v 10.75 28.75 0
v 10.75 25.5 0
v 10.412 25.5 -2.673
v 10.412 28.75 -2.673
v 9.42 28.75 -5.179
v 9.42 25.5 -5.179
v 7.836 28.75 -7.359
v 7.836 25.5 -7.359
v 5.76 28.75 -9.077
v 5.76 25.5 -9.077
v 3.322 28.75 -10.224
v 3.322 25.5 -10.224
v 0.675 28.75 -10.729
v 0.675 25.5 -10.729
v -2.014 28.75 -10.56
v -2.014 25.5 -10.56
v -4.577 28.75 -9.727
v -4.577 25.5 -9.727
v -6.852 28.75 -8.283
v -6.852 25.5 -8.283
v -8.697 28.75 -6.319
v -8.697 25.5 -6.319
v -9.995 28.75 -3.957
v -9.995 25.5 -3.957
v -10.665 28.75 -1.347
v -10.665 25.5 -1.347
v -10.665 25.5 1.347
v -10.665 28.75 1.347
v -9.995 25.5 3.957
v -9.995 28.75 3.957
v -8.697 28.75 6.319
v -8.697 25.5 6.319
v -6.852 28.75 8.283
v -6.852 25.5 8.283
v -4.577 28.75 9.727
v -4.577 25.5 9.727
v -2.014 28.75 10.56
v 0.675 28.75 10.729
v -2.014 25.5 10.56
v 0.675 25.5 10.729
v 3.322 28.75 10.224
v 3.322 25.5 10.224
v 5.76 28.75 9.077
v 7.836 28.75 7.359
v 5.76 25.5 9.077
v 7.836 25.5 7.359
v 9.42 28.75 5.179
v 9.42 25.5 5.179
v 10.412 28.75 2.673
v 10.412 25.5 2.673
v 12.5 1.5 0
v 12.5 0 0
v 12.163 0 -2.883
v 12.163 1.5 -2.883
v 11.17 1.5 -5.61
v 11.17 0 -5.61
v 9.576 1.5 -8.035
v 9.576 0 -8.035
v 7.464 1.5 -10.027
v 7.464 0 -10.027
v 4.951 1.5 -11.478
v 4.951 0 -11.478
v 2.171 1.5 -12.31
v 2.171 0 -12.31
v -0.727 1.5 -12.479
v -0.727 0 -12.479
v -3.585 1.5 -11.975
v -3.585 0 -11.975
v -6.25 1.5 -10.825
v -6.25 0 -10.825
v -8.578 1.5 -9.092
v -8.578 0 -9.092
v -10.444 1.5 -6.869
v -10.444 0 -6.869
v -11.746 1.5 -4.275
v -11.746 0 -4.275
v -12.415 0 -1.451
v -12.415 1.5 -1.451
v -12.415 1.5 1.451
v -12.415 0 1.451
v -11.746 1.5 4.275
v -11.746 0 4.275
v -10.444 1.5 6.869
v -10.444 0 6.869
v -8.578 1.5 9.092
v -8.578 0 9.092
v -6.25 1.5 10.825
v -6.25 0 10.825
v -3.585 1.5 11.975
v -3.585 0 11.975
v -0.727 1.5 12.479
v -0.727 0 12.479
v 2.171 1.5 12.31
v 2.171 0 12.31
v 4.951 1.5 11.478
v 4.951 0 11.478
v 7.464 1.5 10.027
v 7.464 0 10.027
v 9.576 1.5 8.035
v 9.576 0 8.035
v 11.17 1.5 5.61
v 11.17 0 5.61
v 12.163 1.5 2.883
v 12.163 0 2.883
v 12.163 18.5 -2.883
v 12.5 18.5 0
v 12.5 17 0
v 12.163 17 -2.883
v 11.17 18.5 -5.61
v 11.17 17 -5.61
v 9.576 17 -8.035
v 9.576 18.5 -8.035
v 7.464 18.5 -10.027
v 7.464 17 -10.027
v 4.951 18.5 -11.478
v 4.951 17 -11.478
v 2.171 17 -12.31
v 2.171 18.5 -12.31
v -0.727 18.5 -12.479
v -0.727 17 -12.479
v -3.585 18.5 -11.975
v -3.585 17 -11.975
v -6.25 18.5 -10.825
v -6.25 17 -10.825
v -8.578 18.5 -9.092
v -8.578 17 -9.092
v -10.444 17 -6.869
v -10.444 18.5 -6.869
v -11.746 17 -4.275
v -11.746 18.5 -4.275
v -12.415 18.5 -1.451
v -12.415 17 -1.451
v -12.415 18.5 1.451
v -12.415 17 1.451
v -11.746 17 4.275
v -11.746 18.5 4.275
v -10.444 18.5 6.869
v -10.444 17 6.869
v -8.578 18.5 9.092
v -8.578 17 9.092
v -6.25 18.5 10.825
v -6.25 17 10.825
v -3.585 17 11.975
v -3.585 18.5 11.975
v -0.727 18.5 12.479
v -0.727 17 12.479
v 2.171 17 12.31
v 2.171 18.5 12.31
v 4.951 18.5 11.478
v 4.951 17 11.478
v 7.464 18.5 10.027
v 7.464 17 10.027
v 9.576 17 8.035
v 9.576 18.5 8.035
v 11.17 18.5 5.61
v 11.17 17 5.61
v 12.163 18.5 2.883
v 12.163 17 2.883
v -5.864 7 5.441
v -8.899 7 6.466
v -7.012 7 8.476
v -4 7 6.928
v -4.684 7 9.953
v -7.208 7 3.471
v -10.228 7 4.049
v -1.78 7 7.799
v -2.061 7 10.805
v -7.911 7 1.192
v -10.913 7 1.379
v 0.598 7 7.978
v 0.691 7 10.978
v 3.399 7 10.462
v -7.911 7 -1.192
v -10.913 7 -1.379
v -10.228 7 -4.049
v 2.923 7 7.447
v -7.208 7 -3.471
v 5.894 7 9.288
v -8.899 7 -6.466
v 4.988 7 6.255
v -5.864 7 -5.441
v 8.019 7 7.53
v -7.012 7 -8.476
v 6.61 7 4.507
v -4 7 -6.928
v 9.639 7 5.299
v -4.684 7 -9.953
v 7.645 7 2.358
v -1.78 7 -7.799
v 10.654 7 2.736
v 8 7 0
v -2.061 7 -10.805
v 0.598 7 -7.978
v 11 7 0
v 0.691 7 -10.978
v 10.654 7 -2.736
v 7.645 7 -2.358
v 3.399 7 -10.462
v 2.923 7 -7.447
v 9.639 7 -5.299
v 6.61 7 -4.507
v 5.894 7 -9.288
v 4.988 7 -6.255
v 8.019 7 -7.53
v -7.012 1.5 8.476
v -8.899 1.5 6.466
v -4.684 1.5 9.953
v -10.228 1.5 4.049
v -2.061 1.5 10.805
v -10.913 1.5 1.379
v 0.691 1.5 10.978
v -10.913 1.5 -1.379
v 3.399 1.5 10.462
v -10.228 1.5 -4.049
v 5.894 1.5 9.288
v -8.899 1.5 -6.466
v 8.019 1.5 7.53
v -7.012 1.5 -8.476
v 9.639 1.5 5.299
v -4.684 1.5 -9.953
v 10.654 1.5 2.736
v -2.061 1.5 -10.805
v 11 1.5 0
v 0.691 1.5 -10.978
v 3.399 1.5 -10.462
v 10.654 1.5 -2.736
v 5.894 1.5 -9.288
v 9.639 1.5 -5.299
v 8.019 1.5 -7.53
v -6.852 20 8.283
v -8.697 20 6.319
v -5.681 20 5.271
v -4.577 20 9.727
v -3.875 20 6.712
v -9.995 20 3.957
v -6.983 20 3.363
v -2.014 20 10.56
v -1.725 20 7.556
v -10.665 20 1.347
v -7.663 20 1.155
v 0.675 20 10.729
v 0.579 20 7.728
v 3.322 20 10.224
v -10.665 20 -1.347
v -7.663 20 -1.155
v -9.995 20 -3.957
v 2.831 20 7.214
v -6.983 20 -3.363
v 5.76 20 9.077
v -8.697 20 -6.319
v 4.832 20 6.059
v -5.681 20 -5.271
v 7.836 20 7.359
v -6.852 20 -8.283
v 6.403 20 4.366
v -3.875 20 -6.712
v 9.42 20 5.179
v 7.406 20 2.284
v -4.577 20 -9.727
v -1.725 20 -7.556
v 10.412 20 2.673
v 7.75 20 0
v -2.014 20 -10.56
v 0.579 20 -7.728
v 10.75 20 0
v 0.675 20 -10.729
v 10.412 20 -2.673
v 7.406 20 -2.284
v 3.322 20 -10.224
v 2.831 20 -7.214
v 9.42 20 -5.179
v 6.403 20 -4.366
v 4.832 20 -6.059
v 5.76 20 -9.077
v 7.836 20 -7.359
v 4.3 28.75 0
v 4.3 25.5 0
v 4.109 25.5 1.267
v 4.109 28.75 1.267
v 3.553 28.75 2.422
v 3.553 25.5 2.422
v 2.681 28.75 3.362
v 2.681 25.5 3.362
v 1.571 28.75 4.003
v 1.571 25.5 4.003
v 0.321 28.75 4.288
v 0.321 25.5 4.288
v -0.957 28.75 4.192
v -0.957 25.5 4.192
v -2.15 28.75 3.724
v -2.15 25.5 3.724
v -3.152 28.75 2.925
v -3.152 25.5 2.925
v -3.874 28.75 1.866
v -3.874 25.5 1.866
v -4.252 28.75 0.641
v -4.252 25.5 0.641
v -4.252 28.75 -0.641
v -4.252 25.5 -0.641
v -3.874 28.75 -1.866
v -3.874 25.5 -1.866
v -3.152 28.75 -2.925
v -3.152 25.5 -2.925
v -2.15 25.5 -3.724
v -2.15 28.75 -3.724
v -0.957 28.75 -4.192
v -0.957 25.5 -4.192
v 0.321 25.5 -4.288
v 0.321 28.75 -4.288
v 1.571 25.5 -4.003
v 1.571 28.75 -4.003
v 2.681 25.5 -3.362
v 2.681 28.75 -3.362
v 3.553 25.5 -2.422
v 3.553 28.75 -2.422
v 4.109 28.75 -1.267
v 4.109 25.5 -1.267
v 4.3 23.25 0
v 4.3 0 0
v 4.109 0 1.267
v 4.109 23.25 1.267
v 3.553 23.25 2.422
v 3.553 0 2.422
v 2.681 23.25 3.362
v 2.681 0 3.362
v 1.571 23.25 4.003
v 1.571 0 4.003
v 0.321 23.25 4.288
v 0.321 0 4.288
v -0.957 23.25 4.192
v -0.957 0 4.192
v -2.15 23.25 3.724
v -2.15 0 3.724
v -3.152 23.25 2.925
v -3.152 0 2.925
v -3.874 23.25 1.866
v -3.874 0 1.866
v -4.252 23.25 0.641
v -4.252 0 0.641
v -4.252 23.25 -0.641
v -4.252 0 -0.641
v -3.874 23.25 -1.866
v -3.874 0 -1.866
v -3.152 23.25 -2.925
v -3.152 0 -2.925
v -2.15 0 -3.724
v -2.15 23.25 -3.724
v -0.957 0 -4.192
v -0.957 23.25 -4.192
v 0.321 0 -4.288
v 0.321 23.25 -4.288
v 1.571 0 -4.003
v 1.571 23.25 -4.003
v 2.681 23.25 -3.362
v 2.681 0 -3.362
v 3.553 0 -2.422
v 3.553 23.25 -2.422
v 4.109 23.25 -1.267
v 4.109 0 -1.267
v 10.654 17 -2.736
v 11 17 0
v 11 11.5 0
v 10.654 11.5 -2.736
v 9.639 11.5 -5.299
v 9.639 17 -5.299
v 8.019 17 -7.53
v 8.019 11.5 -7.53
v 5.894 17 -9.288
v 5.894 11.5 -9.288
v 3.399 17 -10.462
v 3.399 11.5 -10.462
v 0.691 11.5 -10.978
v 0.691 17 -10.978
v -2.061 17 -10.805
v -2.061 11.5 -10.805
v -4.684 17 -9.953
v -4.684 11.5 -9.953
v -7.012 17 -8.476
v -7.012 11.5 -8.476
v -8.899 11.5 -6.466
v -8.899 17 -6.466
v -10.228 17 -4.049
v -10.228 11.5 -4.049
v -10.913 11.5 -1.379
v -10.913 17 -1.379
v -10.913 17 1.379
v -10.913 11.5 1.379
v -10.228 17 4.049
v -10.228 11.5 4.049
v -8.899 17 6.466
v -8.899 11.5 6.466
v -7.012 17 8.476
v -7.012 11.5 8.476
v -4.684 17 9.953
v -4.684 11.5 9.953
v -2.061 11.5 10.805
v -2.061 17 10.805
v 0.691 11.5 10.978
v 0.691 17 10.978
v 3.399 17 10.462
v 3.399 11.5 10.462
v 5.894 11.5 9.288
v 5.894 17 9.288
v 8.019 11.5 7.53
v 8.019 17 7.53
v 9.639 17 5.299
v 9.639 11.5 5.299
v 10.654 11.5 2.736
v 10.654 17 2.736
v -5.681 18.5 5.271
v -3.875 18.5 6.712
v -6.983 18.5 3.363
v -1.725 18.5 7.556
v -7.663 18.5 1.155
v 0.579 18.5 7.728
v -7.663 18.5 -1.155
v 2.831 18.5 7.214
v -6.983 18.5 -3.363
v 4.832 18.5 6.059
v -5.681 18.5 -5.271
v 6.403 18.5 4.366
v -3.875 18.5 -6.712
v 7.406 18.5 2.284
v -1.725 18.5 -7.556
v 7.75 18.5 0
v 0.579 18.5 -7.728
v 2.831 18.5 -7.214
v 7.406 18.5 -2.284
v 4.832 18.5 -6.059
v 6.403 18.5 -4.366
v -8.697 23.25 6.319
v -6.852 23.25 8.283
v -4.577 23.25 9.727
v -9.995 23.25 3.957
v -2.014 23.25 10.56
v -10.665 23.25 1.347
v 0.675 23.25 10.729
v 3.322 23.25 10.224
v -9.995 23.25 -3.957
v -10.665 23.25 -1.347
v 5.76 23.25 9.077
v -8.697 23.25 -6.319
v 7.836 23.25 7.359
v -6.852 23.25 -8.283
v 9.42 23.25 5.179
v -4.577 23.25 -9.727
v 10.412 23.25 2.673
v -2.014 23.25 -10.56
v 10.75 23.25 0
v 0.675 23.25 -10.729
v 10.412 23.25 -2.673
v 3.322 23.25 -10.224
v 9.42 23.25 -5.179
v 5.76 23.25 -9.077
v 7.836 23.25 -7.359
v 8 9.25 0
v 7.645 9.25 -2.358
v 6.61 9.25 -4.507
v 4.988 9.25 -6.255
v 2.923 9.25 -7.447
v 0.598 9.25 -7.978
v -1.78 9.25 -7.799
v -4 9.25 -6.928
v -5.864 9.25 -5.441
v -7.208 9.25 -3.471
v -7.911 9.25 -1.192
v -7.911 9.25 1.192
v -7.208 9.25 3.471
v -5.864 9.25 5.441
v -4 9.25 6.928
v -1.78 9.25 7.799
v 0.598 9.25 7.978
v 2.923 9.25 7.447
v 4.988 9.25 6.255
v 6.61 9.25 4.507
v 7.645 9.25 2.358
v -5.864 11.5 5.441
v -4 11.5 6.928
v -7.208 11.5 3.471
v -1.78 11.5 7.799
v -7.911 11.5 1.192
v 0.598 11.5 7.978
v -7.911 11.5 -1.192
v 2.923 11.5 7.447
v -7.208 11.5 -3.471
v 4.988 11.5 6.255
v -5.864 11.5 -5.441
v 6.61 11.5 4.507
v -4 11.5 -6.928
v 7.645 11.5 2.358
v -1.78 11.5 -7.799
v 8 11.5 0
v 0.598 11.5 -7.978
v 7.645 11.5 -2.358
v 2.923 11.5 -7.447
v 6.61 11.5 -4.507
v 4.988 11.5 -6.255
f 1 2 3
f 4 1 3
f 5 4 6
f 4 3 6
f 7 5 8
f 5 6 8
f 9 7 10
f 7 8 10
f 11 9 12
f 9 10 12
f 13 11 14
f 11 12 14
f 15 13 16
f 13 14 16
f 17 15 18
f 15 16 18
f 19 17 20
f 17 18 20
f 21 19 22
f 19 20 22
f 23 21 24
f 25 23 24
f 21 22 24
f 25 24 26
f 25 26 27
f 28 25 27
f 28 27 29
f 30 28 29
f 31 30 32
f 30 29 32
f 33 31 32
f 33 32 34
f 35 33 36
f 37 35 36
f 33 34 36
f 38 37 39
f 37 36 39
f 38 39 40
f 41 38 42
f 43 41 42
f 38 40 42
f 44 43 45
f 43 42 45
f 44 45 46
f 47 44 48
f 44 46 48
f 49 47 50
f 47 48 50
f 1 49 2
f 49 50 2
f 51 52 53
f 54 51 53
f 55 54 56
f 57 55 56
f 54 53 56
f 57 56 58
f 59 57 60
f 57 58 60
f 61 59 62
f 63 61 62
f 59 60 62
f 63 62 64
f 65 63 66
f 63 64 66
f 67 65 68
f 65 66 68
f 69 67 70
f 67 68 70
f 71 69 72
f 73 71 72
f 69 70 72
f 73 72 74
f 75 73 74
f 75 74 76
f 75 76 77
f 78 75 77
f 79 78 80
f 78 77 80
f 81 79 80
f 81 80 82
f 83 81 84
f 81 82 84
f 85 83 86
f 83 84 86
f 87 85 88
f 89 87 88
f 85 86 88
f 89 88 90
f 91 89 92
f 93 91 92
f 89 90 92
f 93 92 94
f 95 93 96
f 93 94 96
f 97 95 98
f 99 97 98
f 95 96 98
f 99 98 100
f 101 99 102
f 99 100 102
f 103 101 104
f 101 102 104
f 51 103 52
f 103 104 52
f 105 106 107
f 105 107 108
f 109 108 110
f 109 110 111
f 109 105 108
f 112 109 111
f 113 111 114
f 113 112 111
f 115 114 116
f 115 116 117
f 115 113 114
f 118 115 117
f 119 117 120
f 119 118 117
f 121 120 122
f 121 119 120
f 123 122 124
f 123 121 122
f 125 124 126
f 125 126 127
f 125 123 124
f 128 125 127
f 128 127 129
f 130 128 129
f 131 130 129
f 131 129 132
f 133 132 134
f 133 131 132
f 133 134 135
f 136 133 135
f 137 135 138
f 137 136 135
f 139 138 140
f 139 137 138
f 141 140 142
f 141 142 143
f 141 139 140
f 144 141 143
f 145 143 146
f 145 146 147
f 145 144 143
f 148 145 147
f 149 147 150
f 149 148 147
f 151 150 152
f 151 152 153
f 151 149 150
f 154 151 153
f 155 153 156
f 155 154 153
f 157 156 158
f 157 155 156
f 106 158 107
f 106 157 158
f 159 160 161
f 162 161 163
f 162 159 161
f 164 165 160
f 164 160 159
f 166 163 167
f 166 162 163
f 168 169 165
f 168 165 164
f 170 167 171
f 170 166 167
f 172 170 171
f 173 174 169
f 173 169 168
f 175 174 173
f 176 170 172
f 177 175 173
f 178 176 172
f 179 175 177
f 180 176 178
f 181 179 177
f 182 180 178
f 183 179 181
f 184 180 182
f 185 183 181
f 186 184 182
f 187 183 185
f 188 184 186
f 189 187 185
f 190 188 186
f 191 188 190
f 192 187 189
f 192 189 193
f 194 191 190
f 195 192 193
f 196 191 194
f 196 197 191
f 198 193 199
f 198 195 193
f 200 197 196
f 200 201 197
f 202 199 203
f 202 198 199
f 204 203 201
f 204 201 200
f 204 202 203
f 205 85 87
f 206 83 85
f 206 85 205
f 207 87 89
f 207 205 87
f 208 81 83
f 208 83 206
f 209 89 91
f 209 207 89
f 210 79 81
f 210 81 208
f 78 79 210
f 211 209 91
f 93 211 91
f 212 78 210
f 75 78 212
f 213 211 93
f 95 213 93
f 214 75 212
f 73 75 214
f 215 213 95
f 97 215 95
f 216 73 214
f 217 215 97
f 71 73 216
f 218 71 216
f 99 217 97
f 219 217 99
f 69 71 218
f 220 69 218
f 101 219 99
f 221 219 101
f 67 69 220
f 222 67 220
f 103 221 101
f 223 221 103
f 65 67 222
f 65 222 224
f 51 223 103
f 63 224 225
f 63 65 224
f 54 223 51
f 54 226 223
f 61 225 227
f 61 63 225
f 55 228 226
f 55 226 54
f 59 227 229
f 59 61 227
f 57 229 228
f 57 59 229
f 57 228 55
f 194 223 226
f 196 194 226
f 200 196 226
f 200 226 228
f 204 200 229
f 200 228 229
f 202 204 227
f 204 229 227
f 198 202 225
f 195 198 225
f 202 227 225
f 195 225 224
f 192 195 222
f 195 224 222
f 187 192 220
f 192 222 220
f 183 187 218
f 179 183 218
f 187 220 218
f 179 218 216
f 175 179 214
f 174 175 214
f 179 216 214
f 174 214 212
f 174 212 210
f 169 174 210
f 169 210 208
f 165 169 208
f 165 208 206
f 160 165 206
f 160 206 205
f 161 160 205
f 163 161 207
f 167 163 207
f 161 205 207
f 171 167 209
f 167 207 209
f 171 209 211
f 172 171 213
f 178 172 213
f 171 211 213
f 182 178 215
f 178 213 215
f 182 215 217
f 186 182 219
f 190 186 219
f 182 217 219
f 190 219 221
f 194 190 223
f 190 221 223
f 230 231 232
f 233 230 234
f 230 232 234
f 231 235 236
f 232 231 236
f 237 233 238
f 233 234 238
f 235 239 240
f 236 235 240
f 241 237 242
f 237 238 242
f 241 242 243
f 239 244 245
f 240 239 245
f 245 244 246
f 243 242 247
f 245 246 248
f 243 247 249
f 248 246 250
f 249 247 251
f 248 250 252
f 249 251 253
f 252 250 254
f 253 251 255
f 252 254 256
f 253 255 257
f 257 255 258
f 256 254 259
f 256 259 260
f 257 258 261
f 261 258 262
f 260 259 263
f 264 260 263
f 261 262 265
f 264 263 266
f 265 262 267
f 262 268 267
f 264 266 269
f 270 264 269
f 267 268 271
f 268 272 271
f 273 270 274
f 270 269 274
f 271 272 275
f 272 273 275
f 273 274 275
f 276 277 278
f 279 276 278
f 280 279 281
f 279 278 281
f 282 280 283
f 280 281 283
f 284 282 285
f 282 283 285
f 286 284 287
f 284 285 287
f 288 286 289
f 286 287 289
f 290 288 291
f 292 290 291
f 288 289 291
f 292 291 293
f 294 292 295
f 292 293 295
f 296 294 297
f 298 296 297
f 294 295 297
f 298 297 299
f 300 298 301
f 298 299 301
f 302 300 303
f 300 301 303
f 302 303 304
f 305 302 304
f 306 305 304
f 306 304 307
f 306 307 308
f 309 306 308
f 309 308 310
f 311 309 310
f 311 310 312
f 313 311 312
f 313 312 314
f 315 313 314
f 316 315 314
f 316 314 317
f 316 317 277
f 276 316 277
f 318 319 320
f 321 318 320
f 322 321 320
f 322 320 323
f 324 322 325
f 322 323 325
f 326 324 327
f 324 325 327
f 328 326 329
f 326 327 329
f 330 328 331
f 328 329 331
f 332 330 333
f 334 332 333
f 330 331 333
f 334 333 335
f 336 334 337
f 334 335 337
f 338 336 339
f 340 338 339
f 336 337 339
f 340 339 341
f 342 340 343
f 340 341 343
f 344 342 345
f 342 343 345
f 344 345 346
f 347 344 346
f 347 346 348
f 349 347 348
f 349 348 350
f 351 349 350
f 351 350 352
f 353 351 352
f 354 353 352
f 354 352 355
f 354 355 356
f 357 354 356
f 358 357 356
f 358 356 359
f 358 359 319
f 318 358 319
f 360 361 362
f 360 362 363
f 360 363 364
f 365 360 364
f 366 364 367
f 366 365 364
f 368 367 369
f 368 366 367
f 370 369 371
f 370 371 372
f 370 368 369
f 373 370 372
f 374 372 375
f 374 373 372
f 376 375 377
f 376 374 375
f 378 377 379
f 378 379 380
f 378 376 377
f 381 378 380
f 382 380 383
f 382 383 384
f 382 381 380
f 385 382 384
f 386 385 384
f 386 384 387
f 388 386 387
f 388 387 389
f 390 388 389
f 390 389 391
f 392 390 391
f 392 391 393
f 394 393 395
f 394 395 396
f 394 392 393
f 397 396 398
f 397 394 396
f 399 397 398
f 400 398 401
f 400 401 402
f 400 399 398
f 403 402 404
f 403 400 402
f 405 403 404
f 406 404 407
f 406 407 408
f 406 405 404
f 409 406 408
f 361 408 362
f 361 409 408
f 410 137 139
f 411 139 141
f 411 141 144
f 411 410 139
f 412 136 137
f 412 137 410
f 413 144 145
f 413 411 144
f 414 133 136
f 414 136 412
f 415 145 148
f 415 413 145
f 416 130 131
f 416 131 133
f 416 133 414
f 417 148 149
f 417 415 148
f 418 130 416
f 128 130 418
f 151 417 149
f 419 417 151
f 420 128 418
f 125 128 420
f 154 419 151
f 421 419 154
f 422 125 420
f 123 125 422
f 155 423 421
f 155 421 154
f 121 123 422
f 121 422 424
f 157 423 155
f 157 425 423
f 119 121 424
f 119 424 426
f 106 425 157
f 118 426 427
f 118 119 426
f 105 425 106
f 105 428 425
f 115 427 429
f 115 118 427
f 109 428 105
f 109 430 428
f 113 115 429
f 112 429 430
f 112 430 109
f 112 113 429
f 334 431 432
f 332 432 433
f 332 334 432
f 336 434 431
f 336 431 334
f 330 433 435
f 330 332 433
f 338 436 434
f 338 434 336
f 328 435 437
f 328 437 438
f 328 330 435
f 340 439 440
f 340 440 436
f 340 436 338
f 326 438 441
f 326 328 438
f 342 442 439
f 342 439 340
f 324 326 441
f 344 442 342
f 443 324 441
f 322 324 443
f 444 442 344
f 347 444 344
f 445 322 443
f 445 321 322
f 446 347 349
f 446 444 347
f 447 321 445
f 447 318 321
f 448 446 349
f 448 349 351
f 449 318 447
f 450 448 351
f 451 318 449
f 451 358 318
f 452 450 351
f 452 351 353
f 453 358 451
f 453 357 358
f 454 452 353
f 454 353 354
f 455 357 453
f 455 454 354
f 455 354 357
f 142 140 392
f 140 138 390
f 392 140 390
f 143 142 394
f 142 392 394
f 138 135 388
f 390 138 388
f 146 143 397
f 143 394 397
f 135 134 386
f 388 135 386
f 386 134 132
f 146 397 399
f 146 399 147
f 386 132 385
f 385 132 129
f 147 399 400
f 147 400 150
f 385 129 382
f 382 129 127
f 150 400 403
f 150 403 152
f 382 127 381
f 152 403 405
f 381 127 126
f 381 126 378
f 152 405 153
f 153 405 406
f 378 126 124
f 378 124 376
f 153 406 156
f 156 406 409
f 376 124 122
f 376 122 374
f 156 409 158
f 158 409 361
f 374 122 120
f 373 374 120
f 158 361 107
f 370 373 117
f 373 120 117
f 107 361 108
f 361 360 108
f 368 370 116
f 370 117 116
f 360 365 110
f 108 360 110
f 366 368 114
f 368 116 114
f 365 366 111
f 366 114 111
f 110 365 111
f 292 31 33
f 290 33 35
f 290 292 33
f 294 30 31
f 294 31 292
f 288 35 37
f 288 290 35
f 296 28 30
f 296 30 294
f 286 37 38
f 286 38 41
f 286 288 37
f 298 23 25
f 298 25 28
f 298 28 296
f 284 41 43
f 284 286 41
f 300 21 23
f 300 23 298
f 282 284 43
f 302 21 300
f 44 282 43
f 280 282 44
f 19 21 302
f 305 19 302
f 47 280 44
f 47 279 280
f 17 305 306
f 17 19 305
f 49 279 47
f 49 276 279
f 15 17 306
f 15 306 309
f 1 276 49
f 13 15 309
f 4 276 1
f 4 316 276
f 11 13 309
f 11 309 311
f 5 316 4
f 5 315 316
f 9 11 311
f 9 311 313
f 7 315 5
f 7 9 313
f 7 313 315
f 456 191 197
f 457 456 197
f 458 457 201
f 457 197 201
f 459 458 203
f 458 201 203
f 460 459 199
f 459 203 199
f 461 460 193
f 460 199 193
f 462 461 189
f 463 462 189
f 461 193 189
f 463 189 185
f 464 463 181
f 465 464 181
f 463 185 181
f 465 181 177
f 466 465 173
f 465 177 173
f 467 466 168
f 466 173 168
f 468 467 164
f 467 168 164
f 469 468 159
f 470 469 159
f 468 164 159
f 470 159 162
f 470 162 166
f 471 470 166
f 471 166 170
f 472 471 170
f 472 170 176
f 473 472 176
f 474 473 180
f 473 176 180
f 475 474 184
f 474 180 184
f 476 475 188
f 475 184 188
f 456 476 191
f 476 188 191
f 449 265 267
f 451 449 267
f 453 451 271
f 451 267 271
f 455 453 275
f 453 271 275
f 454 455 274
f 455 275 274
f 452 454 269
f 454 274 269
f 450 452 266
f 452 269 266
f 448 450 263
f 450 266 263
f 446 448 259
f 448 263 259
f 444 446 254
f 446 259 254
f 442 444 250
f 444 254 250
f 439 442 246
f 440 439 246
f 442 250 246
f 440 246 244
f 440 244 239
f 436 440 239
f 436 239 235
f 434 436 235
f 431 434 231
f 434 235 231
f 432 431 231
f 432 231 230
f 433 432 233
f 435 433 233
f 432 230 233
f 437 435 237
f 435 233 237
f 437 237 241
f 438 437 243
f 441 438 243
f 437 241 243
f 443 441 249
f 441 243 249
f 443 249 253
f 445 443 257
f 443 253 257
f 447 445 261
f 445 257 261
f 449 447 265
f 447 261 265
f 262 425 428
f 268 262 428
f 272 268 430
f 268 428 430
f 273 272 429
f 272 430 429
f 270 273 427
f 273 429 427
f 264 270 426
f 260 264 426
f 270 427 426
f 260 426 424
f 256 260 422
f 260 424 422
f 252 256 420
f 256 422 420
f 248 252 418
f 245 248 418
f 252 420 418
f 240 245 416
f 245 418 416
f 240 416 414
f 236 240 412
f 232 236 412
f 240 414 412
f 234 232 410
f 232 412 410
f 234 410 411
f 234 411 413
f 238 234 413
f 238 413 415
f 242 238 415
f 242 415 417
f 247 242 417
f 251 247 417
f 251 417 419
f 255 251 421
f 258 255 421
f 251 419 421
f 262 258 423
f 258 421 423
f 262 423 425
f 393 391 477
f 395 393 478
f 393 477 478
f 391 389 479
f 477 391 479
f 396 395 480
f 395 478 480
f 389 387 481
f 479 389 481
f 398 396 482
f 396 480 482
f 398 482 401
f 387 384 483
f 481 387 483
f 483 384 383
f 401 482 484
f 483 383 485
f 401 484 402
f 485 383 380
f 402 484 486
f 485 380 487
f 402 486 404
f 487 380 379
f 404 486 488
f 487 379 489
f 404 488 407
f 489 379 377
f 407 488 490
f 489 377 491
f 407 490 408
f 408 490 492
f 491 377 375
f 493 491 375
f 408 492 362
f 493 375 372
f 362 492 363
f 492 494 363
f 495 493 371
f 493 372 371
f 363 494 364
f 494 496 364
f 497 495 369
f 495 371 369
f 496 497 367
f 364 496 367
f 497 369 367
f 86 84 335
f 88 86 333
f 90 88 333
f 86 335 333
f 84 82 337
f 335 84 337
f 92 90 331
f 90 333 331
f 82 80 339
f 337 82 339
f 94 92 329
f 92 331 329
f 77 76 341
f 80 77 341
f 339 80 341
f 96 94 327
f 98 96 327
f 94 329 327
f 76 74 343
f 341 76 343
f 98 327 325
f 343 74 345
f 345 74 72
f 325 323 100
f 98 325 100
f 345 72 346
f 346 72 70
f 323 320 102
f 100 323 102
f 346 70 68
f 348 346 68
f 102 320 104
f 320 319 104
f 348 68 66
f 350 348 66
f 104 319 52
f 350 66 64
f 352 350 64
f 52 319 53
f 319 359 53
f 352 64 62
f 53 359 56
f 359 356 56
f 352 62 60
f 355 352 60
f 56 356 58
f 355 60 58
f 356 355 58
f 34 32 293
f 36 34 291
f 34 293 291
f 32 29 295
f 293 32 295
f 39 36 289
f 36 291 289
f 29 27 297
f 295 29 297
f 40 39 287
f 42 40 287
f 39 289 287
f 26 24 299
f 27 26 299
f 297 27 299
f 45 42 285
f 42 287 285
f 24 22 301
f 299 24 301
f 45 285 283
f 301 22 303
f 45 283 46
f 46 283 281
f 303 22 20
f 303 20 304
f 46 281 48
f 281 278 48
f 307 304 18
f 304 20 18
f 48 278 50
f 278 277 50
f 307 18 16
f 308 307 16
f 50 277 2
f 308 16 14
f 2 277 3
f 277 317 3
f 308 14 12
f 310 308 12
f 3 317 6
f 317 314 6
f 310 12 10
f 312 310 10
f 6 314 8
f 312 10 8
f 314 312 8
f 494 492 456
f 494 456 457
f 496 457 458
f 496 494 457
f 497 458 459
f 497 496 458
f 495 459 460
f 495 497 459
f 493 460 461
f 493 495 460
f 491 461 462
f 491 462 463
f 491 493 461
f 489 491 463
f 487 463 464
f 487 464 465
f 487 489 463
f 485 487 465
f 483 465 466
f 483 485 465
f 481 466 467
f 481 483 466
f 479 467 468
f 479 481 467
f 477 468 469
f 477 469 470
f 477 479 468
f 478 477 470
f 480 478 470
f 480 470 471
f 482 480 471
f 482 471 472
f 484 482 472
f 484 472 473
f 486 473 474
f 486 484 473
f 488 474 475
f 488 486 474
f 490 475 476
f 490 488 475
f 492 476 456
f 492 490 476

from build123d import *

# Parameters (mm, degrees)
SKETCH1_R           = 12.5
BOSS_EXTRUDE1_DEPTH = 1.5
SKETCH2_R           = 11
BOSS_EXTRUDE2_DEPTH = 5.5
SKETCH3_R           = 8
BOSS_EXTRUDE3_DEPTH = 2.25
SKETCH4_R           = 7.75
BOSS_EXTRUDE4_DEPTH = 1.5
SKETCH5_R           = 10.75
BOSS_EXTRUDE6_DEPTH = 3.25
BOSS_EXTRUDE7_START = 2.25
SKETCH10_R          = 10.75
BOSS_EXTRUDE7_DEPTH = 3.25
SKETCH6_R           = 4.3
CUT_EXTRUDE2_DEPTH  = 50


with BuildPart() as part:
    # Sketch1 → Boss-Extrude1 (new body)
    with BuildSketch(Plane(origin=(0, 0, 0), x_dir=(1, 0, 0), z_dir=(0, 1, 0))):
        Circle(SKETCH1_R)
    extrude(amount=BOSS_EXTRUDE1_DEPTH)

    # Sketch2 → Boss-Extrude2 (add)
    with BuildSketch(Plane(origin=(0, 1.5, 0), x_dir=(1, 0, 0), z_dir=(0, 1, 0))):
        Circle(SKETCH2_R)
    extrude(amount=BOSS_EXTRUDE2_DEPTH)

    # Sketch3 → Boss-Extrude3 (add)
    with BuildSketch(Plane(origin=(0, 7, 0), x_dir=(1, 0, 0), z_dir=(0, 1, 0))):
        Circle(SKETCH3_R)
    extrude(amount=BOSS_EXTRUDE3_DEPTH)

    # Mirror1: part across plane


with BuildPart() as part_1:
    add(part.part)
    add(part.part.mirror(Plane.ZX.offset(9.25)))

    # Sketch4 → Boss-Extrude4 (add)
    with BuildSketch(Plane(origin=(0, 18.5, 0), x_dir=(1, 0, 0), z_dir=(0, 1, 0))):
        Circle(SKETCH4_R)
    extrude(amount=BOSS_EXTRUDE4_DEPTH)

    # Sketch5 → Boss-Extrude6 (add)
    with BuildSketch(Plane(origin=(0, 20, 0), x_dir=(1, 0, 0), z_dir=(0, 1, 0))):
        Circle(SKETCH5_R)
    extrude(amount=BOSS_EXTRUDE6_DEPTH)


with BuildPart() as body_2:
    # Sketch10 → Boss-Extrude7 (new body)
    with BuildSketch(Plane(origin=(0, 23.25, 0), x_dir=(1, 0, 0), z_dir=(0, 1, 0)).offset(BOSS_EXTRUDE7_START)):
        Circle(SKETCH10_R)
    extrude(amount=BOSS_EXTRUDE7_DEPTH)


with BuildPart() as cut_extrude2_tool:
    # Sketch6 → Cut-Extrude2 (new body)
    with BuildSketch(Plane.XZ):
        Circle(SKETCH6_R)
    extrude(amount=-CUT_EXTRUDE2_DEPTH)


with BuildPart() as part_2:
    add(part_1.part)

    # Cut-Extrude2: cut by cut_extrude2_tool
    add(cut_extrude2_tool.part, mode=Mode.SUBTRACT)


with BuildPart() as body_2_1:
    add(body_2.part)

    # Cut-Extrude2: cut by cut_extrude2_tool
    add(cut_extrude2_tool.part, mode=Mode.SUBTRACT)


solid = Compound([part_2.part, body_2_1.part])
